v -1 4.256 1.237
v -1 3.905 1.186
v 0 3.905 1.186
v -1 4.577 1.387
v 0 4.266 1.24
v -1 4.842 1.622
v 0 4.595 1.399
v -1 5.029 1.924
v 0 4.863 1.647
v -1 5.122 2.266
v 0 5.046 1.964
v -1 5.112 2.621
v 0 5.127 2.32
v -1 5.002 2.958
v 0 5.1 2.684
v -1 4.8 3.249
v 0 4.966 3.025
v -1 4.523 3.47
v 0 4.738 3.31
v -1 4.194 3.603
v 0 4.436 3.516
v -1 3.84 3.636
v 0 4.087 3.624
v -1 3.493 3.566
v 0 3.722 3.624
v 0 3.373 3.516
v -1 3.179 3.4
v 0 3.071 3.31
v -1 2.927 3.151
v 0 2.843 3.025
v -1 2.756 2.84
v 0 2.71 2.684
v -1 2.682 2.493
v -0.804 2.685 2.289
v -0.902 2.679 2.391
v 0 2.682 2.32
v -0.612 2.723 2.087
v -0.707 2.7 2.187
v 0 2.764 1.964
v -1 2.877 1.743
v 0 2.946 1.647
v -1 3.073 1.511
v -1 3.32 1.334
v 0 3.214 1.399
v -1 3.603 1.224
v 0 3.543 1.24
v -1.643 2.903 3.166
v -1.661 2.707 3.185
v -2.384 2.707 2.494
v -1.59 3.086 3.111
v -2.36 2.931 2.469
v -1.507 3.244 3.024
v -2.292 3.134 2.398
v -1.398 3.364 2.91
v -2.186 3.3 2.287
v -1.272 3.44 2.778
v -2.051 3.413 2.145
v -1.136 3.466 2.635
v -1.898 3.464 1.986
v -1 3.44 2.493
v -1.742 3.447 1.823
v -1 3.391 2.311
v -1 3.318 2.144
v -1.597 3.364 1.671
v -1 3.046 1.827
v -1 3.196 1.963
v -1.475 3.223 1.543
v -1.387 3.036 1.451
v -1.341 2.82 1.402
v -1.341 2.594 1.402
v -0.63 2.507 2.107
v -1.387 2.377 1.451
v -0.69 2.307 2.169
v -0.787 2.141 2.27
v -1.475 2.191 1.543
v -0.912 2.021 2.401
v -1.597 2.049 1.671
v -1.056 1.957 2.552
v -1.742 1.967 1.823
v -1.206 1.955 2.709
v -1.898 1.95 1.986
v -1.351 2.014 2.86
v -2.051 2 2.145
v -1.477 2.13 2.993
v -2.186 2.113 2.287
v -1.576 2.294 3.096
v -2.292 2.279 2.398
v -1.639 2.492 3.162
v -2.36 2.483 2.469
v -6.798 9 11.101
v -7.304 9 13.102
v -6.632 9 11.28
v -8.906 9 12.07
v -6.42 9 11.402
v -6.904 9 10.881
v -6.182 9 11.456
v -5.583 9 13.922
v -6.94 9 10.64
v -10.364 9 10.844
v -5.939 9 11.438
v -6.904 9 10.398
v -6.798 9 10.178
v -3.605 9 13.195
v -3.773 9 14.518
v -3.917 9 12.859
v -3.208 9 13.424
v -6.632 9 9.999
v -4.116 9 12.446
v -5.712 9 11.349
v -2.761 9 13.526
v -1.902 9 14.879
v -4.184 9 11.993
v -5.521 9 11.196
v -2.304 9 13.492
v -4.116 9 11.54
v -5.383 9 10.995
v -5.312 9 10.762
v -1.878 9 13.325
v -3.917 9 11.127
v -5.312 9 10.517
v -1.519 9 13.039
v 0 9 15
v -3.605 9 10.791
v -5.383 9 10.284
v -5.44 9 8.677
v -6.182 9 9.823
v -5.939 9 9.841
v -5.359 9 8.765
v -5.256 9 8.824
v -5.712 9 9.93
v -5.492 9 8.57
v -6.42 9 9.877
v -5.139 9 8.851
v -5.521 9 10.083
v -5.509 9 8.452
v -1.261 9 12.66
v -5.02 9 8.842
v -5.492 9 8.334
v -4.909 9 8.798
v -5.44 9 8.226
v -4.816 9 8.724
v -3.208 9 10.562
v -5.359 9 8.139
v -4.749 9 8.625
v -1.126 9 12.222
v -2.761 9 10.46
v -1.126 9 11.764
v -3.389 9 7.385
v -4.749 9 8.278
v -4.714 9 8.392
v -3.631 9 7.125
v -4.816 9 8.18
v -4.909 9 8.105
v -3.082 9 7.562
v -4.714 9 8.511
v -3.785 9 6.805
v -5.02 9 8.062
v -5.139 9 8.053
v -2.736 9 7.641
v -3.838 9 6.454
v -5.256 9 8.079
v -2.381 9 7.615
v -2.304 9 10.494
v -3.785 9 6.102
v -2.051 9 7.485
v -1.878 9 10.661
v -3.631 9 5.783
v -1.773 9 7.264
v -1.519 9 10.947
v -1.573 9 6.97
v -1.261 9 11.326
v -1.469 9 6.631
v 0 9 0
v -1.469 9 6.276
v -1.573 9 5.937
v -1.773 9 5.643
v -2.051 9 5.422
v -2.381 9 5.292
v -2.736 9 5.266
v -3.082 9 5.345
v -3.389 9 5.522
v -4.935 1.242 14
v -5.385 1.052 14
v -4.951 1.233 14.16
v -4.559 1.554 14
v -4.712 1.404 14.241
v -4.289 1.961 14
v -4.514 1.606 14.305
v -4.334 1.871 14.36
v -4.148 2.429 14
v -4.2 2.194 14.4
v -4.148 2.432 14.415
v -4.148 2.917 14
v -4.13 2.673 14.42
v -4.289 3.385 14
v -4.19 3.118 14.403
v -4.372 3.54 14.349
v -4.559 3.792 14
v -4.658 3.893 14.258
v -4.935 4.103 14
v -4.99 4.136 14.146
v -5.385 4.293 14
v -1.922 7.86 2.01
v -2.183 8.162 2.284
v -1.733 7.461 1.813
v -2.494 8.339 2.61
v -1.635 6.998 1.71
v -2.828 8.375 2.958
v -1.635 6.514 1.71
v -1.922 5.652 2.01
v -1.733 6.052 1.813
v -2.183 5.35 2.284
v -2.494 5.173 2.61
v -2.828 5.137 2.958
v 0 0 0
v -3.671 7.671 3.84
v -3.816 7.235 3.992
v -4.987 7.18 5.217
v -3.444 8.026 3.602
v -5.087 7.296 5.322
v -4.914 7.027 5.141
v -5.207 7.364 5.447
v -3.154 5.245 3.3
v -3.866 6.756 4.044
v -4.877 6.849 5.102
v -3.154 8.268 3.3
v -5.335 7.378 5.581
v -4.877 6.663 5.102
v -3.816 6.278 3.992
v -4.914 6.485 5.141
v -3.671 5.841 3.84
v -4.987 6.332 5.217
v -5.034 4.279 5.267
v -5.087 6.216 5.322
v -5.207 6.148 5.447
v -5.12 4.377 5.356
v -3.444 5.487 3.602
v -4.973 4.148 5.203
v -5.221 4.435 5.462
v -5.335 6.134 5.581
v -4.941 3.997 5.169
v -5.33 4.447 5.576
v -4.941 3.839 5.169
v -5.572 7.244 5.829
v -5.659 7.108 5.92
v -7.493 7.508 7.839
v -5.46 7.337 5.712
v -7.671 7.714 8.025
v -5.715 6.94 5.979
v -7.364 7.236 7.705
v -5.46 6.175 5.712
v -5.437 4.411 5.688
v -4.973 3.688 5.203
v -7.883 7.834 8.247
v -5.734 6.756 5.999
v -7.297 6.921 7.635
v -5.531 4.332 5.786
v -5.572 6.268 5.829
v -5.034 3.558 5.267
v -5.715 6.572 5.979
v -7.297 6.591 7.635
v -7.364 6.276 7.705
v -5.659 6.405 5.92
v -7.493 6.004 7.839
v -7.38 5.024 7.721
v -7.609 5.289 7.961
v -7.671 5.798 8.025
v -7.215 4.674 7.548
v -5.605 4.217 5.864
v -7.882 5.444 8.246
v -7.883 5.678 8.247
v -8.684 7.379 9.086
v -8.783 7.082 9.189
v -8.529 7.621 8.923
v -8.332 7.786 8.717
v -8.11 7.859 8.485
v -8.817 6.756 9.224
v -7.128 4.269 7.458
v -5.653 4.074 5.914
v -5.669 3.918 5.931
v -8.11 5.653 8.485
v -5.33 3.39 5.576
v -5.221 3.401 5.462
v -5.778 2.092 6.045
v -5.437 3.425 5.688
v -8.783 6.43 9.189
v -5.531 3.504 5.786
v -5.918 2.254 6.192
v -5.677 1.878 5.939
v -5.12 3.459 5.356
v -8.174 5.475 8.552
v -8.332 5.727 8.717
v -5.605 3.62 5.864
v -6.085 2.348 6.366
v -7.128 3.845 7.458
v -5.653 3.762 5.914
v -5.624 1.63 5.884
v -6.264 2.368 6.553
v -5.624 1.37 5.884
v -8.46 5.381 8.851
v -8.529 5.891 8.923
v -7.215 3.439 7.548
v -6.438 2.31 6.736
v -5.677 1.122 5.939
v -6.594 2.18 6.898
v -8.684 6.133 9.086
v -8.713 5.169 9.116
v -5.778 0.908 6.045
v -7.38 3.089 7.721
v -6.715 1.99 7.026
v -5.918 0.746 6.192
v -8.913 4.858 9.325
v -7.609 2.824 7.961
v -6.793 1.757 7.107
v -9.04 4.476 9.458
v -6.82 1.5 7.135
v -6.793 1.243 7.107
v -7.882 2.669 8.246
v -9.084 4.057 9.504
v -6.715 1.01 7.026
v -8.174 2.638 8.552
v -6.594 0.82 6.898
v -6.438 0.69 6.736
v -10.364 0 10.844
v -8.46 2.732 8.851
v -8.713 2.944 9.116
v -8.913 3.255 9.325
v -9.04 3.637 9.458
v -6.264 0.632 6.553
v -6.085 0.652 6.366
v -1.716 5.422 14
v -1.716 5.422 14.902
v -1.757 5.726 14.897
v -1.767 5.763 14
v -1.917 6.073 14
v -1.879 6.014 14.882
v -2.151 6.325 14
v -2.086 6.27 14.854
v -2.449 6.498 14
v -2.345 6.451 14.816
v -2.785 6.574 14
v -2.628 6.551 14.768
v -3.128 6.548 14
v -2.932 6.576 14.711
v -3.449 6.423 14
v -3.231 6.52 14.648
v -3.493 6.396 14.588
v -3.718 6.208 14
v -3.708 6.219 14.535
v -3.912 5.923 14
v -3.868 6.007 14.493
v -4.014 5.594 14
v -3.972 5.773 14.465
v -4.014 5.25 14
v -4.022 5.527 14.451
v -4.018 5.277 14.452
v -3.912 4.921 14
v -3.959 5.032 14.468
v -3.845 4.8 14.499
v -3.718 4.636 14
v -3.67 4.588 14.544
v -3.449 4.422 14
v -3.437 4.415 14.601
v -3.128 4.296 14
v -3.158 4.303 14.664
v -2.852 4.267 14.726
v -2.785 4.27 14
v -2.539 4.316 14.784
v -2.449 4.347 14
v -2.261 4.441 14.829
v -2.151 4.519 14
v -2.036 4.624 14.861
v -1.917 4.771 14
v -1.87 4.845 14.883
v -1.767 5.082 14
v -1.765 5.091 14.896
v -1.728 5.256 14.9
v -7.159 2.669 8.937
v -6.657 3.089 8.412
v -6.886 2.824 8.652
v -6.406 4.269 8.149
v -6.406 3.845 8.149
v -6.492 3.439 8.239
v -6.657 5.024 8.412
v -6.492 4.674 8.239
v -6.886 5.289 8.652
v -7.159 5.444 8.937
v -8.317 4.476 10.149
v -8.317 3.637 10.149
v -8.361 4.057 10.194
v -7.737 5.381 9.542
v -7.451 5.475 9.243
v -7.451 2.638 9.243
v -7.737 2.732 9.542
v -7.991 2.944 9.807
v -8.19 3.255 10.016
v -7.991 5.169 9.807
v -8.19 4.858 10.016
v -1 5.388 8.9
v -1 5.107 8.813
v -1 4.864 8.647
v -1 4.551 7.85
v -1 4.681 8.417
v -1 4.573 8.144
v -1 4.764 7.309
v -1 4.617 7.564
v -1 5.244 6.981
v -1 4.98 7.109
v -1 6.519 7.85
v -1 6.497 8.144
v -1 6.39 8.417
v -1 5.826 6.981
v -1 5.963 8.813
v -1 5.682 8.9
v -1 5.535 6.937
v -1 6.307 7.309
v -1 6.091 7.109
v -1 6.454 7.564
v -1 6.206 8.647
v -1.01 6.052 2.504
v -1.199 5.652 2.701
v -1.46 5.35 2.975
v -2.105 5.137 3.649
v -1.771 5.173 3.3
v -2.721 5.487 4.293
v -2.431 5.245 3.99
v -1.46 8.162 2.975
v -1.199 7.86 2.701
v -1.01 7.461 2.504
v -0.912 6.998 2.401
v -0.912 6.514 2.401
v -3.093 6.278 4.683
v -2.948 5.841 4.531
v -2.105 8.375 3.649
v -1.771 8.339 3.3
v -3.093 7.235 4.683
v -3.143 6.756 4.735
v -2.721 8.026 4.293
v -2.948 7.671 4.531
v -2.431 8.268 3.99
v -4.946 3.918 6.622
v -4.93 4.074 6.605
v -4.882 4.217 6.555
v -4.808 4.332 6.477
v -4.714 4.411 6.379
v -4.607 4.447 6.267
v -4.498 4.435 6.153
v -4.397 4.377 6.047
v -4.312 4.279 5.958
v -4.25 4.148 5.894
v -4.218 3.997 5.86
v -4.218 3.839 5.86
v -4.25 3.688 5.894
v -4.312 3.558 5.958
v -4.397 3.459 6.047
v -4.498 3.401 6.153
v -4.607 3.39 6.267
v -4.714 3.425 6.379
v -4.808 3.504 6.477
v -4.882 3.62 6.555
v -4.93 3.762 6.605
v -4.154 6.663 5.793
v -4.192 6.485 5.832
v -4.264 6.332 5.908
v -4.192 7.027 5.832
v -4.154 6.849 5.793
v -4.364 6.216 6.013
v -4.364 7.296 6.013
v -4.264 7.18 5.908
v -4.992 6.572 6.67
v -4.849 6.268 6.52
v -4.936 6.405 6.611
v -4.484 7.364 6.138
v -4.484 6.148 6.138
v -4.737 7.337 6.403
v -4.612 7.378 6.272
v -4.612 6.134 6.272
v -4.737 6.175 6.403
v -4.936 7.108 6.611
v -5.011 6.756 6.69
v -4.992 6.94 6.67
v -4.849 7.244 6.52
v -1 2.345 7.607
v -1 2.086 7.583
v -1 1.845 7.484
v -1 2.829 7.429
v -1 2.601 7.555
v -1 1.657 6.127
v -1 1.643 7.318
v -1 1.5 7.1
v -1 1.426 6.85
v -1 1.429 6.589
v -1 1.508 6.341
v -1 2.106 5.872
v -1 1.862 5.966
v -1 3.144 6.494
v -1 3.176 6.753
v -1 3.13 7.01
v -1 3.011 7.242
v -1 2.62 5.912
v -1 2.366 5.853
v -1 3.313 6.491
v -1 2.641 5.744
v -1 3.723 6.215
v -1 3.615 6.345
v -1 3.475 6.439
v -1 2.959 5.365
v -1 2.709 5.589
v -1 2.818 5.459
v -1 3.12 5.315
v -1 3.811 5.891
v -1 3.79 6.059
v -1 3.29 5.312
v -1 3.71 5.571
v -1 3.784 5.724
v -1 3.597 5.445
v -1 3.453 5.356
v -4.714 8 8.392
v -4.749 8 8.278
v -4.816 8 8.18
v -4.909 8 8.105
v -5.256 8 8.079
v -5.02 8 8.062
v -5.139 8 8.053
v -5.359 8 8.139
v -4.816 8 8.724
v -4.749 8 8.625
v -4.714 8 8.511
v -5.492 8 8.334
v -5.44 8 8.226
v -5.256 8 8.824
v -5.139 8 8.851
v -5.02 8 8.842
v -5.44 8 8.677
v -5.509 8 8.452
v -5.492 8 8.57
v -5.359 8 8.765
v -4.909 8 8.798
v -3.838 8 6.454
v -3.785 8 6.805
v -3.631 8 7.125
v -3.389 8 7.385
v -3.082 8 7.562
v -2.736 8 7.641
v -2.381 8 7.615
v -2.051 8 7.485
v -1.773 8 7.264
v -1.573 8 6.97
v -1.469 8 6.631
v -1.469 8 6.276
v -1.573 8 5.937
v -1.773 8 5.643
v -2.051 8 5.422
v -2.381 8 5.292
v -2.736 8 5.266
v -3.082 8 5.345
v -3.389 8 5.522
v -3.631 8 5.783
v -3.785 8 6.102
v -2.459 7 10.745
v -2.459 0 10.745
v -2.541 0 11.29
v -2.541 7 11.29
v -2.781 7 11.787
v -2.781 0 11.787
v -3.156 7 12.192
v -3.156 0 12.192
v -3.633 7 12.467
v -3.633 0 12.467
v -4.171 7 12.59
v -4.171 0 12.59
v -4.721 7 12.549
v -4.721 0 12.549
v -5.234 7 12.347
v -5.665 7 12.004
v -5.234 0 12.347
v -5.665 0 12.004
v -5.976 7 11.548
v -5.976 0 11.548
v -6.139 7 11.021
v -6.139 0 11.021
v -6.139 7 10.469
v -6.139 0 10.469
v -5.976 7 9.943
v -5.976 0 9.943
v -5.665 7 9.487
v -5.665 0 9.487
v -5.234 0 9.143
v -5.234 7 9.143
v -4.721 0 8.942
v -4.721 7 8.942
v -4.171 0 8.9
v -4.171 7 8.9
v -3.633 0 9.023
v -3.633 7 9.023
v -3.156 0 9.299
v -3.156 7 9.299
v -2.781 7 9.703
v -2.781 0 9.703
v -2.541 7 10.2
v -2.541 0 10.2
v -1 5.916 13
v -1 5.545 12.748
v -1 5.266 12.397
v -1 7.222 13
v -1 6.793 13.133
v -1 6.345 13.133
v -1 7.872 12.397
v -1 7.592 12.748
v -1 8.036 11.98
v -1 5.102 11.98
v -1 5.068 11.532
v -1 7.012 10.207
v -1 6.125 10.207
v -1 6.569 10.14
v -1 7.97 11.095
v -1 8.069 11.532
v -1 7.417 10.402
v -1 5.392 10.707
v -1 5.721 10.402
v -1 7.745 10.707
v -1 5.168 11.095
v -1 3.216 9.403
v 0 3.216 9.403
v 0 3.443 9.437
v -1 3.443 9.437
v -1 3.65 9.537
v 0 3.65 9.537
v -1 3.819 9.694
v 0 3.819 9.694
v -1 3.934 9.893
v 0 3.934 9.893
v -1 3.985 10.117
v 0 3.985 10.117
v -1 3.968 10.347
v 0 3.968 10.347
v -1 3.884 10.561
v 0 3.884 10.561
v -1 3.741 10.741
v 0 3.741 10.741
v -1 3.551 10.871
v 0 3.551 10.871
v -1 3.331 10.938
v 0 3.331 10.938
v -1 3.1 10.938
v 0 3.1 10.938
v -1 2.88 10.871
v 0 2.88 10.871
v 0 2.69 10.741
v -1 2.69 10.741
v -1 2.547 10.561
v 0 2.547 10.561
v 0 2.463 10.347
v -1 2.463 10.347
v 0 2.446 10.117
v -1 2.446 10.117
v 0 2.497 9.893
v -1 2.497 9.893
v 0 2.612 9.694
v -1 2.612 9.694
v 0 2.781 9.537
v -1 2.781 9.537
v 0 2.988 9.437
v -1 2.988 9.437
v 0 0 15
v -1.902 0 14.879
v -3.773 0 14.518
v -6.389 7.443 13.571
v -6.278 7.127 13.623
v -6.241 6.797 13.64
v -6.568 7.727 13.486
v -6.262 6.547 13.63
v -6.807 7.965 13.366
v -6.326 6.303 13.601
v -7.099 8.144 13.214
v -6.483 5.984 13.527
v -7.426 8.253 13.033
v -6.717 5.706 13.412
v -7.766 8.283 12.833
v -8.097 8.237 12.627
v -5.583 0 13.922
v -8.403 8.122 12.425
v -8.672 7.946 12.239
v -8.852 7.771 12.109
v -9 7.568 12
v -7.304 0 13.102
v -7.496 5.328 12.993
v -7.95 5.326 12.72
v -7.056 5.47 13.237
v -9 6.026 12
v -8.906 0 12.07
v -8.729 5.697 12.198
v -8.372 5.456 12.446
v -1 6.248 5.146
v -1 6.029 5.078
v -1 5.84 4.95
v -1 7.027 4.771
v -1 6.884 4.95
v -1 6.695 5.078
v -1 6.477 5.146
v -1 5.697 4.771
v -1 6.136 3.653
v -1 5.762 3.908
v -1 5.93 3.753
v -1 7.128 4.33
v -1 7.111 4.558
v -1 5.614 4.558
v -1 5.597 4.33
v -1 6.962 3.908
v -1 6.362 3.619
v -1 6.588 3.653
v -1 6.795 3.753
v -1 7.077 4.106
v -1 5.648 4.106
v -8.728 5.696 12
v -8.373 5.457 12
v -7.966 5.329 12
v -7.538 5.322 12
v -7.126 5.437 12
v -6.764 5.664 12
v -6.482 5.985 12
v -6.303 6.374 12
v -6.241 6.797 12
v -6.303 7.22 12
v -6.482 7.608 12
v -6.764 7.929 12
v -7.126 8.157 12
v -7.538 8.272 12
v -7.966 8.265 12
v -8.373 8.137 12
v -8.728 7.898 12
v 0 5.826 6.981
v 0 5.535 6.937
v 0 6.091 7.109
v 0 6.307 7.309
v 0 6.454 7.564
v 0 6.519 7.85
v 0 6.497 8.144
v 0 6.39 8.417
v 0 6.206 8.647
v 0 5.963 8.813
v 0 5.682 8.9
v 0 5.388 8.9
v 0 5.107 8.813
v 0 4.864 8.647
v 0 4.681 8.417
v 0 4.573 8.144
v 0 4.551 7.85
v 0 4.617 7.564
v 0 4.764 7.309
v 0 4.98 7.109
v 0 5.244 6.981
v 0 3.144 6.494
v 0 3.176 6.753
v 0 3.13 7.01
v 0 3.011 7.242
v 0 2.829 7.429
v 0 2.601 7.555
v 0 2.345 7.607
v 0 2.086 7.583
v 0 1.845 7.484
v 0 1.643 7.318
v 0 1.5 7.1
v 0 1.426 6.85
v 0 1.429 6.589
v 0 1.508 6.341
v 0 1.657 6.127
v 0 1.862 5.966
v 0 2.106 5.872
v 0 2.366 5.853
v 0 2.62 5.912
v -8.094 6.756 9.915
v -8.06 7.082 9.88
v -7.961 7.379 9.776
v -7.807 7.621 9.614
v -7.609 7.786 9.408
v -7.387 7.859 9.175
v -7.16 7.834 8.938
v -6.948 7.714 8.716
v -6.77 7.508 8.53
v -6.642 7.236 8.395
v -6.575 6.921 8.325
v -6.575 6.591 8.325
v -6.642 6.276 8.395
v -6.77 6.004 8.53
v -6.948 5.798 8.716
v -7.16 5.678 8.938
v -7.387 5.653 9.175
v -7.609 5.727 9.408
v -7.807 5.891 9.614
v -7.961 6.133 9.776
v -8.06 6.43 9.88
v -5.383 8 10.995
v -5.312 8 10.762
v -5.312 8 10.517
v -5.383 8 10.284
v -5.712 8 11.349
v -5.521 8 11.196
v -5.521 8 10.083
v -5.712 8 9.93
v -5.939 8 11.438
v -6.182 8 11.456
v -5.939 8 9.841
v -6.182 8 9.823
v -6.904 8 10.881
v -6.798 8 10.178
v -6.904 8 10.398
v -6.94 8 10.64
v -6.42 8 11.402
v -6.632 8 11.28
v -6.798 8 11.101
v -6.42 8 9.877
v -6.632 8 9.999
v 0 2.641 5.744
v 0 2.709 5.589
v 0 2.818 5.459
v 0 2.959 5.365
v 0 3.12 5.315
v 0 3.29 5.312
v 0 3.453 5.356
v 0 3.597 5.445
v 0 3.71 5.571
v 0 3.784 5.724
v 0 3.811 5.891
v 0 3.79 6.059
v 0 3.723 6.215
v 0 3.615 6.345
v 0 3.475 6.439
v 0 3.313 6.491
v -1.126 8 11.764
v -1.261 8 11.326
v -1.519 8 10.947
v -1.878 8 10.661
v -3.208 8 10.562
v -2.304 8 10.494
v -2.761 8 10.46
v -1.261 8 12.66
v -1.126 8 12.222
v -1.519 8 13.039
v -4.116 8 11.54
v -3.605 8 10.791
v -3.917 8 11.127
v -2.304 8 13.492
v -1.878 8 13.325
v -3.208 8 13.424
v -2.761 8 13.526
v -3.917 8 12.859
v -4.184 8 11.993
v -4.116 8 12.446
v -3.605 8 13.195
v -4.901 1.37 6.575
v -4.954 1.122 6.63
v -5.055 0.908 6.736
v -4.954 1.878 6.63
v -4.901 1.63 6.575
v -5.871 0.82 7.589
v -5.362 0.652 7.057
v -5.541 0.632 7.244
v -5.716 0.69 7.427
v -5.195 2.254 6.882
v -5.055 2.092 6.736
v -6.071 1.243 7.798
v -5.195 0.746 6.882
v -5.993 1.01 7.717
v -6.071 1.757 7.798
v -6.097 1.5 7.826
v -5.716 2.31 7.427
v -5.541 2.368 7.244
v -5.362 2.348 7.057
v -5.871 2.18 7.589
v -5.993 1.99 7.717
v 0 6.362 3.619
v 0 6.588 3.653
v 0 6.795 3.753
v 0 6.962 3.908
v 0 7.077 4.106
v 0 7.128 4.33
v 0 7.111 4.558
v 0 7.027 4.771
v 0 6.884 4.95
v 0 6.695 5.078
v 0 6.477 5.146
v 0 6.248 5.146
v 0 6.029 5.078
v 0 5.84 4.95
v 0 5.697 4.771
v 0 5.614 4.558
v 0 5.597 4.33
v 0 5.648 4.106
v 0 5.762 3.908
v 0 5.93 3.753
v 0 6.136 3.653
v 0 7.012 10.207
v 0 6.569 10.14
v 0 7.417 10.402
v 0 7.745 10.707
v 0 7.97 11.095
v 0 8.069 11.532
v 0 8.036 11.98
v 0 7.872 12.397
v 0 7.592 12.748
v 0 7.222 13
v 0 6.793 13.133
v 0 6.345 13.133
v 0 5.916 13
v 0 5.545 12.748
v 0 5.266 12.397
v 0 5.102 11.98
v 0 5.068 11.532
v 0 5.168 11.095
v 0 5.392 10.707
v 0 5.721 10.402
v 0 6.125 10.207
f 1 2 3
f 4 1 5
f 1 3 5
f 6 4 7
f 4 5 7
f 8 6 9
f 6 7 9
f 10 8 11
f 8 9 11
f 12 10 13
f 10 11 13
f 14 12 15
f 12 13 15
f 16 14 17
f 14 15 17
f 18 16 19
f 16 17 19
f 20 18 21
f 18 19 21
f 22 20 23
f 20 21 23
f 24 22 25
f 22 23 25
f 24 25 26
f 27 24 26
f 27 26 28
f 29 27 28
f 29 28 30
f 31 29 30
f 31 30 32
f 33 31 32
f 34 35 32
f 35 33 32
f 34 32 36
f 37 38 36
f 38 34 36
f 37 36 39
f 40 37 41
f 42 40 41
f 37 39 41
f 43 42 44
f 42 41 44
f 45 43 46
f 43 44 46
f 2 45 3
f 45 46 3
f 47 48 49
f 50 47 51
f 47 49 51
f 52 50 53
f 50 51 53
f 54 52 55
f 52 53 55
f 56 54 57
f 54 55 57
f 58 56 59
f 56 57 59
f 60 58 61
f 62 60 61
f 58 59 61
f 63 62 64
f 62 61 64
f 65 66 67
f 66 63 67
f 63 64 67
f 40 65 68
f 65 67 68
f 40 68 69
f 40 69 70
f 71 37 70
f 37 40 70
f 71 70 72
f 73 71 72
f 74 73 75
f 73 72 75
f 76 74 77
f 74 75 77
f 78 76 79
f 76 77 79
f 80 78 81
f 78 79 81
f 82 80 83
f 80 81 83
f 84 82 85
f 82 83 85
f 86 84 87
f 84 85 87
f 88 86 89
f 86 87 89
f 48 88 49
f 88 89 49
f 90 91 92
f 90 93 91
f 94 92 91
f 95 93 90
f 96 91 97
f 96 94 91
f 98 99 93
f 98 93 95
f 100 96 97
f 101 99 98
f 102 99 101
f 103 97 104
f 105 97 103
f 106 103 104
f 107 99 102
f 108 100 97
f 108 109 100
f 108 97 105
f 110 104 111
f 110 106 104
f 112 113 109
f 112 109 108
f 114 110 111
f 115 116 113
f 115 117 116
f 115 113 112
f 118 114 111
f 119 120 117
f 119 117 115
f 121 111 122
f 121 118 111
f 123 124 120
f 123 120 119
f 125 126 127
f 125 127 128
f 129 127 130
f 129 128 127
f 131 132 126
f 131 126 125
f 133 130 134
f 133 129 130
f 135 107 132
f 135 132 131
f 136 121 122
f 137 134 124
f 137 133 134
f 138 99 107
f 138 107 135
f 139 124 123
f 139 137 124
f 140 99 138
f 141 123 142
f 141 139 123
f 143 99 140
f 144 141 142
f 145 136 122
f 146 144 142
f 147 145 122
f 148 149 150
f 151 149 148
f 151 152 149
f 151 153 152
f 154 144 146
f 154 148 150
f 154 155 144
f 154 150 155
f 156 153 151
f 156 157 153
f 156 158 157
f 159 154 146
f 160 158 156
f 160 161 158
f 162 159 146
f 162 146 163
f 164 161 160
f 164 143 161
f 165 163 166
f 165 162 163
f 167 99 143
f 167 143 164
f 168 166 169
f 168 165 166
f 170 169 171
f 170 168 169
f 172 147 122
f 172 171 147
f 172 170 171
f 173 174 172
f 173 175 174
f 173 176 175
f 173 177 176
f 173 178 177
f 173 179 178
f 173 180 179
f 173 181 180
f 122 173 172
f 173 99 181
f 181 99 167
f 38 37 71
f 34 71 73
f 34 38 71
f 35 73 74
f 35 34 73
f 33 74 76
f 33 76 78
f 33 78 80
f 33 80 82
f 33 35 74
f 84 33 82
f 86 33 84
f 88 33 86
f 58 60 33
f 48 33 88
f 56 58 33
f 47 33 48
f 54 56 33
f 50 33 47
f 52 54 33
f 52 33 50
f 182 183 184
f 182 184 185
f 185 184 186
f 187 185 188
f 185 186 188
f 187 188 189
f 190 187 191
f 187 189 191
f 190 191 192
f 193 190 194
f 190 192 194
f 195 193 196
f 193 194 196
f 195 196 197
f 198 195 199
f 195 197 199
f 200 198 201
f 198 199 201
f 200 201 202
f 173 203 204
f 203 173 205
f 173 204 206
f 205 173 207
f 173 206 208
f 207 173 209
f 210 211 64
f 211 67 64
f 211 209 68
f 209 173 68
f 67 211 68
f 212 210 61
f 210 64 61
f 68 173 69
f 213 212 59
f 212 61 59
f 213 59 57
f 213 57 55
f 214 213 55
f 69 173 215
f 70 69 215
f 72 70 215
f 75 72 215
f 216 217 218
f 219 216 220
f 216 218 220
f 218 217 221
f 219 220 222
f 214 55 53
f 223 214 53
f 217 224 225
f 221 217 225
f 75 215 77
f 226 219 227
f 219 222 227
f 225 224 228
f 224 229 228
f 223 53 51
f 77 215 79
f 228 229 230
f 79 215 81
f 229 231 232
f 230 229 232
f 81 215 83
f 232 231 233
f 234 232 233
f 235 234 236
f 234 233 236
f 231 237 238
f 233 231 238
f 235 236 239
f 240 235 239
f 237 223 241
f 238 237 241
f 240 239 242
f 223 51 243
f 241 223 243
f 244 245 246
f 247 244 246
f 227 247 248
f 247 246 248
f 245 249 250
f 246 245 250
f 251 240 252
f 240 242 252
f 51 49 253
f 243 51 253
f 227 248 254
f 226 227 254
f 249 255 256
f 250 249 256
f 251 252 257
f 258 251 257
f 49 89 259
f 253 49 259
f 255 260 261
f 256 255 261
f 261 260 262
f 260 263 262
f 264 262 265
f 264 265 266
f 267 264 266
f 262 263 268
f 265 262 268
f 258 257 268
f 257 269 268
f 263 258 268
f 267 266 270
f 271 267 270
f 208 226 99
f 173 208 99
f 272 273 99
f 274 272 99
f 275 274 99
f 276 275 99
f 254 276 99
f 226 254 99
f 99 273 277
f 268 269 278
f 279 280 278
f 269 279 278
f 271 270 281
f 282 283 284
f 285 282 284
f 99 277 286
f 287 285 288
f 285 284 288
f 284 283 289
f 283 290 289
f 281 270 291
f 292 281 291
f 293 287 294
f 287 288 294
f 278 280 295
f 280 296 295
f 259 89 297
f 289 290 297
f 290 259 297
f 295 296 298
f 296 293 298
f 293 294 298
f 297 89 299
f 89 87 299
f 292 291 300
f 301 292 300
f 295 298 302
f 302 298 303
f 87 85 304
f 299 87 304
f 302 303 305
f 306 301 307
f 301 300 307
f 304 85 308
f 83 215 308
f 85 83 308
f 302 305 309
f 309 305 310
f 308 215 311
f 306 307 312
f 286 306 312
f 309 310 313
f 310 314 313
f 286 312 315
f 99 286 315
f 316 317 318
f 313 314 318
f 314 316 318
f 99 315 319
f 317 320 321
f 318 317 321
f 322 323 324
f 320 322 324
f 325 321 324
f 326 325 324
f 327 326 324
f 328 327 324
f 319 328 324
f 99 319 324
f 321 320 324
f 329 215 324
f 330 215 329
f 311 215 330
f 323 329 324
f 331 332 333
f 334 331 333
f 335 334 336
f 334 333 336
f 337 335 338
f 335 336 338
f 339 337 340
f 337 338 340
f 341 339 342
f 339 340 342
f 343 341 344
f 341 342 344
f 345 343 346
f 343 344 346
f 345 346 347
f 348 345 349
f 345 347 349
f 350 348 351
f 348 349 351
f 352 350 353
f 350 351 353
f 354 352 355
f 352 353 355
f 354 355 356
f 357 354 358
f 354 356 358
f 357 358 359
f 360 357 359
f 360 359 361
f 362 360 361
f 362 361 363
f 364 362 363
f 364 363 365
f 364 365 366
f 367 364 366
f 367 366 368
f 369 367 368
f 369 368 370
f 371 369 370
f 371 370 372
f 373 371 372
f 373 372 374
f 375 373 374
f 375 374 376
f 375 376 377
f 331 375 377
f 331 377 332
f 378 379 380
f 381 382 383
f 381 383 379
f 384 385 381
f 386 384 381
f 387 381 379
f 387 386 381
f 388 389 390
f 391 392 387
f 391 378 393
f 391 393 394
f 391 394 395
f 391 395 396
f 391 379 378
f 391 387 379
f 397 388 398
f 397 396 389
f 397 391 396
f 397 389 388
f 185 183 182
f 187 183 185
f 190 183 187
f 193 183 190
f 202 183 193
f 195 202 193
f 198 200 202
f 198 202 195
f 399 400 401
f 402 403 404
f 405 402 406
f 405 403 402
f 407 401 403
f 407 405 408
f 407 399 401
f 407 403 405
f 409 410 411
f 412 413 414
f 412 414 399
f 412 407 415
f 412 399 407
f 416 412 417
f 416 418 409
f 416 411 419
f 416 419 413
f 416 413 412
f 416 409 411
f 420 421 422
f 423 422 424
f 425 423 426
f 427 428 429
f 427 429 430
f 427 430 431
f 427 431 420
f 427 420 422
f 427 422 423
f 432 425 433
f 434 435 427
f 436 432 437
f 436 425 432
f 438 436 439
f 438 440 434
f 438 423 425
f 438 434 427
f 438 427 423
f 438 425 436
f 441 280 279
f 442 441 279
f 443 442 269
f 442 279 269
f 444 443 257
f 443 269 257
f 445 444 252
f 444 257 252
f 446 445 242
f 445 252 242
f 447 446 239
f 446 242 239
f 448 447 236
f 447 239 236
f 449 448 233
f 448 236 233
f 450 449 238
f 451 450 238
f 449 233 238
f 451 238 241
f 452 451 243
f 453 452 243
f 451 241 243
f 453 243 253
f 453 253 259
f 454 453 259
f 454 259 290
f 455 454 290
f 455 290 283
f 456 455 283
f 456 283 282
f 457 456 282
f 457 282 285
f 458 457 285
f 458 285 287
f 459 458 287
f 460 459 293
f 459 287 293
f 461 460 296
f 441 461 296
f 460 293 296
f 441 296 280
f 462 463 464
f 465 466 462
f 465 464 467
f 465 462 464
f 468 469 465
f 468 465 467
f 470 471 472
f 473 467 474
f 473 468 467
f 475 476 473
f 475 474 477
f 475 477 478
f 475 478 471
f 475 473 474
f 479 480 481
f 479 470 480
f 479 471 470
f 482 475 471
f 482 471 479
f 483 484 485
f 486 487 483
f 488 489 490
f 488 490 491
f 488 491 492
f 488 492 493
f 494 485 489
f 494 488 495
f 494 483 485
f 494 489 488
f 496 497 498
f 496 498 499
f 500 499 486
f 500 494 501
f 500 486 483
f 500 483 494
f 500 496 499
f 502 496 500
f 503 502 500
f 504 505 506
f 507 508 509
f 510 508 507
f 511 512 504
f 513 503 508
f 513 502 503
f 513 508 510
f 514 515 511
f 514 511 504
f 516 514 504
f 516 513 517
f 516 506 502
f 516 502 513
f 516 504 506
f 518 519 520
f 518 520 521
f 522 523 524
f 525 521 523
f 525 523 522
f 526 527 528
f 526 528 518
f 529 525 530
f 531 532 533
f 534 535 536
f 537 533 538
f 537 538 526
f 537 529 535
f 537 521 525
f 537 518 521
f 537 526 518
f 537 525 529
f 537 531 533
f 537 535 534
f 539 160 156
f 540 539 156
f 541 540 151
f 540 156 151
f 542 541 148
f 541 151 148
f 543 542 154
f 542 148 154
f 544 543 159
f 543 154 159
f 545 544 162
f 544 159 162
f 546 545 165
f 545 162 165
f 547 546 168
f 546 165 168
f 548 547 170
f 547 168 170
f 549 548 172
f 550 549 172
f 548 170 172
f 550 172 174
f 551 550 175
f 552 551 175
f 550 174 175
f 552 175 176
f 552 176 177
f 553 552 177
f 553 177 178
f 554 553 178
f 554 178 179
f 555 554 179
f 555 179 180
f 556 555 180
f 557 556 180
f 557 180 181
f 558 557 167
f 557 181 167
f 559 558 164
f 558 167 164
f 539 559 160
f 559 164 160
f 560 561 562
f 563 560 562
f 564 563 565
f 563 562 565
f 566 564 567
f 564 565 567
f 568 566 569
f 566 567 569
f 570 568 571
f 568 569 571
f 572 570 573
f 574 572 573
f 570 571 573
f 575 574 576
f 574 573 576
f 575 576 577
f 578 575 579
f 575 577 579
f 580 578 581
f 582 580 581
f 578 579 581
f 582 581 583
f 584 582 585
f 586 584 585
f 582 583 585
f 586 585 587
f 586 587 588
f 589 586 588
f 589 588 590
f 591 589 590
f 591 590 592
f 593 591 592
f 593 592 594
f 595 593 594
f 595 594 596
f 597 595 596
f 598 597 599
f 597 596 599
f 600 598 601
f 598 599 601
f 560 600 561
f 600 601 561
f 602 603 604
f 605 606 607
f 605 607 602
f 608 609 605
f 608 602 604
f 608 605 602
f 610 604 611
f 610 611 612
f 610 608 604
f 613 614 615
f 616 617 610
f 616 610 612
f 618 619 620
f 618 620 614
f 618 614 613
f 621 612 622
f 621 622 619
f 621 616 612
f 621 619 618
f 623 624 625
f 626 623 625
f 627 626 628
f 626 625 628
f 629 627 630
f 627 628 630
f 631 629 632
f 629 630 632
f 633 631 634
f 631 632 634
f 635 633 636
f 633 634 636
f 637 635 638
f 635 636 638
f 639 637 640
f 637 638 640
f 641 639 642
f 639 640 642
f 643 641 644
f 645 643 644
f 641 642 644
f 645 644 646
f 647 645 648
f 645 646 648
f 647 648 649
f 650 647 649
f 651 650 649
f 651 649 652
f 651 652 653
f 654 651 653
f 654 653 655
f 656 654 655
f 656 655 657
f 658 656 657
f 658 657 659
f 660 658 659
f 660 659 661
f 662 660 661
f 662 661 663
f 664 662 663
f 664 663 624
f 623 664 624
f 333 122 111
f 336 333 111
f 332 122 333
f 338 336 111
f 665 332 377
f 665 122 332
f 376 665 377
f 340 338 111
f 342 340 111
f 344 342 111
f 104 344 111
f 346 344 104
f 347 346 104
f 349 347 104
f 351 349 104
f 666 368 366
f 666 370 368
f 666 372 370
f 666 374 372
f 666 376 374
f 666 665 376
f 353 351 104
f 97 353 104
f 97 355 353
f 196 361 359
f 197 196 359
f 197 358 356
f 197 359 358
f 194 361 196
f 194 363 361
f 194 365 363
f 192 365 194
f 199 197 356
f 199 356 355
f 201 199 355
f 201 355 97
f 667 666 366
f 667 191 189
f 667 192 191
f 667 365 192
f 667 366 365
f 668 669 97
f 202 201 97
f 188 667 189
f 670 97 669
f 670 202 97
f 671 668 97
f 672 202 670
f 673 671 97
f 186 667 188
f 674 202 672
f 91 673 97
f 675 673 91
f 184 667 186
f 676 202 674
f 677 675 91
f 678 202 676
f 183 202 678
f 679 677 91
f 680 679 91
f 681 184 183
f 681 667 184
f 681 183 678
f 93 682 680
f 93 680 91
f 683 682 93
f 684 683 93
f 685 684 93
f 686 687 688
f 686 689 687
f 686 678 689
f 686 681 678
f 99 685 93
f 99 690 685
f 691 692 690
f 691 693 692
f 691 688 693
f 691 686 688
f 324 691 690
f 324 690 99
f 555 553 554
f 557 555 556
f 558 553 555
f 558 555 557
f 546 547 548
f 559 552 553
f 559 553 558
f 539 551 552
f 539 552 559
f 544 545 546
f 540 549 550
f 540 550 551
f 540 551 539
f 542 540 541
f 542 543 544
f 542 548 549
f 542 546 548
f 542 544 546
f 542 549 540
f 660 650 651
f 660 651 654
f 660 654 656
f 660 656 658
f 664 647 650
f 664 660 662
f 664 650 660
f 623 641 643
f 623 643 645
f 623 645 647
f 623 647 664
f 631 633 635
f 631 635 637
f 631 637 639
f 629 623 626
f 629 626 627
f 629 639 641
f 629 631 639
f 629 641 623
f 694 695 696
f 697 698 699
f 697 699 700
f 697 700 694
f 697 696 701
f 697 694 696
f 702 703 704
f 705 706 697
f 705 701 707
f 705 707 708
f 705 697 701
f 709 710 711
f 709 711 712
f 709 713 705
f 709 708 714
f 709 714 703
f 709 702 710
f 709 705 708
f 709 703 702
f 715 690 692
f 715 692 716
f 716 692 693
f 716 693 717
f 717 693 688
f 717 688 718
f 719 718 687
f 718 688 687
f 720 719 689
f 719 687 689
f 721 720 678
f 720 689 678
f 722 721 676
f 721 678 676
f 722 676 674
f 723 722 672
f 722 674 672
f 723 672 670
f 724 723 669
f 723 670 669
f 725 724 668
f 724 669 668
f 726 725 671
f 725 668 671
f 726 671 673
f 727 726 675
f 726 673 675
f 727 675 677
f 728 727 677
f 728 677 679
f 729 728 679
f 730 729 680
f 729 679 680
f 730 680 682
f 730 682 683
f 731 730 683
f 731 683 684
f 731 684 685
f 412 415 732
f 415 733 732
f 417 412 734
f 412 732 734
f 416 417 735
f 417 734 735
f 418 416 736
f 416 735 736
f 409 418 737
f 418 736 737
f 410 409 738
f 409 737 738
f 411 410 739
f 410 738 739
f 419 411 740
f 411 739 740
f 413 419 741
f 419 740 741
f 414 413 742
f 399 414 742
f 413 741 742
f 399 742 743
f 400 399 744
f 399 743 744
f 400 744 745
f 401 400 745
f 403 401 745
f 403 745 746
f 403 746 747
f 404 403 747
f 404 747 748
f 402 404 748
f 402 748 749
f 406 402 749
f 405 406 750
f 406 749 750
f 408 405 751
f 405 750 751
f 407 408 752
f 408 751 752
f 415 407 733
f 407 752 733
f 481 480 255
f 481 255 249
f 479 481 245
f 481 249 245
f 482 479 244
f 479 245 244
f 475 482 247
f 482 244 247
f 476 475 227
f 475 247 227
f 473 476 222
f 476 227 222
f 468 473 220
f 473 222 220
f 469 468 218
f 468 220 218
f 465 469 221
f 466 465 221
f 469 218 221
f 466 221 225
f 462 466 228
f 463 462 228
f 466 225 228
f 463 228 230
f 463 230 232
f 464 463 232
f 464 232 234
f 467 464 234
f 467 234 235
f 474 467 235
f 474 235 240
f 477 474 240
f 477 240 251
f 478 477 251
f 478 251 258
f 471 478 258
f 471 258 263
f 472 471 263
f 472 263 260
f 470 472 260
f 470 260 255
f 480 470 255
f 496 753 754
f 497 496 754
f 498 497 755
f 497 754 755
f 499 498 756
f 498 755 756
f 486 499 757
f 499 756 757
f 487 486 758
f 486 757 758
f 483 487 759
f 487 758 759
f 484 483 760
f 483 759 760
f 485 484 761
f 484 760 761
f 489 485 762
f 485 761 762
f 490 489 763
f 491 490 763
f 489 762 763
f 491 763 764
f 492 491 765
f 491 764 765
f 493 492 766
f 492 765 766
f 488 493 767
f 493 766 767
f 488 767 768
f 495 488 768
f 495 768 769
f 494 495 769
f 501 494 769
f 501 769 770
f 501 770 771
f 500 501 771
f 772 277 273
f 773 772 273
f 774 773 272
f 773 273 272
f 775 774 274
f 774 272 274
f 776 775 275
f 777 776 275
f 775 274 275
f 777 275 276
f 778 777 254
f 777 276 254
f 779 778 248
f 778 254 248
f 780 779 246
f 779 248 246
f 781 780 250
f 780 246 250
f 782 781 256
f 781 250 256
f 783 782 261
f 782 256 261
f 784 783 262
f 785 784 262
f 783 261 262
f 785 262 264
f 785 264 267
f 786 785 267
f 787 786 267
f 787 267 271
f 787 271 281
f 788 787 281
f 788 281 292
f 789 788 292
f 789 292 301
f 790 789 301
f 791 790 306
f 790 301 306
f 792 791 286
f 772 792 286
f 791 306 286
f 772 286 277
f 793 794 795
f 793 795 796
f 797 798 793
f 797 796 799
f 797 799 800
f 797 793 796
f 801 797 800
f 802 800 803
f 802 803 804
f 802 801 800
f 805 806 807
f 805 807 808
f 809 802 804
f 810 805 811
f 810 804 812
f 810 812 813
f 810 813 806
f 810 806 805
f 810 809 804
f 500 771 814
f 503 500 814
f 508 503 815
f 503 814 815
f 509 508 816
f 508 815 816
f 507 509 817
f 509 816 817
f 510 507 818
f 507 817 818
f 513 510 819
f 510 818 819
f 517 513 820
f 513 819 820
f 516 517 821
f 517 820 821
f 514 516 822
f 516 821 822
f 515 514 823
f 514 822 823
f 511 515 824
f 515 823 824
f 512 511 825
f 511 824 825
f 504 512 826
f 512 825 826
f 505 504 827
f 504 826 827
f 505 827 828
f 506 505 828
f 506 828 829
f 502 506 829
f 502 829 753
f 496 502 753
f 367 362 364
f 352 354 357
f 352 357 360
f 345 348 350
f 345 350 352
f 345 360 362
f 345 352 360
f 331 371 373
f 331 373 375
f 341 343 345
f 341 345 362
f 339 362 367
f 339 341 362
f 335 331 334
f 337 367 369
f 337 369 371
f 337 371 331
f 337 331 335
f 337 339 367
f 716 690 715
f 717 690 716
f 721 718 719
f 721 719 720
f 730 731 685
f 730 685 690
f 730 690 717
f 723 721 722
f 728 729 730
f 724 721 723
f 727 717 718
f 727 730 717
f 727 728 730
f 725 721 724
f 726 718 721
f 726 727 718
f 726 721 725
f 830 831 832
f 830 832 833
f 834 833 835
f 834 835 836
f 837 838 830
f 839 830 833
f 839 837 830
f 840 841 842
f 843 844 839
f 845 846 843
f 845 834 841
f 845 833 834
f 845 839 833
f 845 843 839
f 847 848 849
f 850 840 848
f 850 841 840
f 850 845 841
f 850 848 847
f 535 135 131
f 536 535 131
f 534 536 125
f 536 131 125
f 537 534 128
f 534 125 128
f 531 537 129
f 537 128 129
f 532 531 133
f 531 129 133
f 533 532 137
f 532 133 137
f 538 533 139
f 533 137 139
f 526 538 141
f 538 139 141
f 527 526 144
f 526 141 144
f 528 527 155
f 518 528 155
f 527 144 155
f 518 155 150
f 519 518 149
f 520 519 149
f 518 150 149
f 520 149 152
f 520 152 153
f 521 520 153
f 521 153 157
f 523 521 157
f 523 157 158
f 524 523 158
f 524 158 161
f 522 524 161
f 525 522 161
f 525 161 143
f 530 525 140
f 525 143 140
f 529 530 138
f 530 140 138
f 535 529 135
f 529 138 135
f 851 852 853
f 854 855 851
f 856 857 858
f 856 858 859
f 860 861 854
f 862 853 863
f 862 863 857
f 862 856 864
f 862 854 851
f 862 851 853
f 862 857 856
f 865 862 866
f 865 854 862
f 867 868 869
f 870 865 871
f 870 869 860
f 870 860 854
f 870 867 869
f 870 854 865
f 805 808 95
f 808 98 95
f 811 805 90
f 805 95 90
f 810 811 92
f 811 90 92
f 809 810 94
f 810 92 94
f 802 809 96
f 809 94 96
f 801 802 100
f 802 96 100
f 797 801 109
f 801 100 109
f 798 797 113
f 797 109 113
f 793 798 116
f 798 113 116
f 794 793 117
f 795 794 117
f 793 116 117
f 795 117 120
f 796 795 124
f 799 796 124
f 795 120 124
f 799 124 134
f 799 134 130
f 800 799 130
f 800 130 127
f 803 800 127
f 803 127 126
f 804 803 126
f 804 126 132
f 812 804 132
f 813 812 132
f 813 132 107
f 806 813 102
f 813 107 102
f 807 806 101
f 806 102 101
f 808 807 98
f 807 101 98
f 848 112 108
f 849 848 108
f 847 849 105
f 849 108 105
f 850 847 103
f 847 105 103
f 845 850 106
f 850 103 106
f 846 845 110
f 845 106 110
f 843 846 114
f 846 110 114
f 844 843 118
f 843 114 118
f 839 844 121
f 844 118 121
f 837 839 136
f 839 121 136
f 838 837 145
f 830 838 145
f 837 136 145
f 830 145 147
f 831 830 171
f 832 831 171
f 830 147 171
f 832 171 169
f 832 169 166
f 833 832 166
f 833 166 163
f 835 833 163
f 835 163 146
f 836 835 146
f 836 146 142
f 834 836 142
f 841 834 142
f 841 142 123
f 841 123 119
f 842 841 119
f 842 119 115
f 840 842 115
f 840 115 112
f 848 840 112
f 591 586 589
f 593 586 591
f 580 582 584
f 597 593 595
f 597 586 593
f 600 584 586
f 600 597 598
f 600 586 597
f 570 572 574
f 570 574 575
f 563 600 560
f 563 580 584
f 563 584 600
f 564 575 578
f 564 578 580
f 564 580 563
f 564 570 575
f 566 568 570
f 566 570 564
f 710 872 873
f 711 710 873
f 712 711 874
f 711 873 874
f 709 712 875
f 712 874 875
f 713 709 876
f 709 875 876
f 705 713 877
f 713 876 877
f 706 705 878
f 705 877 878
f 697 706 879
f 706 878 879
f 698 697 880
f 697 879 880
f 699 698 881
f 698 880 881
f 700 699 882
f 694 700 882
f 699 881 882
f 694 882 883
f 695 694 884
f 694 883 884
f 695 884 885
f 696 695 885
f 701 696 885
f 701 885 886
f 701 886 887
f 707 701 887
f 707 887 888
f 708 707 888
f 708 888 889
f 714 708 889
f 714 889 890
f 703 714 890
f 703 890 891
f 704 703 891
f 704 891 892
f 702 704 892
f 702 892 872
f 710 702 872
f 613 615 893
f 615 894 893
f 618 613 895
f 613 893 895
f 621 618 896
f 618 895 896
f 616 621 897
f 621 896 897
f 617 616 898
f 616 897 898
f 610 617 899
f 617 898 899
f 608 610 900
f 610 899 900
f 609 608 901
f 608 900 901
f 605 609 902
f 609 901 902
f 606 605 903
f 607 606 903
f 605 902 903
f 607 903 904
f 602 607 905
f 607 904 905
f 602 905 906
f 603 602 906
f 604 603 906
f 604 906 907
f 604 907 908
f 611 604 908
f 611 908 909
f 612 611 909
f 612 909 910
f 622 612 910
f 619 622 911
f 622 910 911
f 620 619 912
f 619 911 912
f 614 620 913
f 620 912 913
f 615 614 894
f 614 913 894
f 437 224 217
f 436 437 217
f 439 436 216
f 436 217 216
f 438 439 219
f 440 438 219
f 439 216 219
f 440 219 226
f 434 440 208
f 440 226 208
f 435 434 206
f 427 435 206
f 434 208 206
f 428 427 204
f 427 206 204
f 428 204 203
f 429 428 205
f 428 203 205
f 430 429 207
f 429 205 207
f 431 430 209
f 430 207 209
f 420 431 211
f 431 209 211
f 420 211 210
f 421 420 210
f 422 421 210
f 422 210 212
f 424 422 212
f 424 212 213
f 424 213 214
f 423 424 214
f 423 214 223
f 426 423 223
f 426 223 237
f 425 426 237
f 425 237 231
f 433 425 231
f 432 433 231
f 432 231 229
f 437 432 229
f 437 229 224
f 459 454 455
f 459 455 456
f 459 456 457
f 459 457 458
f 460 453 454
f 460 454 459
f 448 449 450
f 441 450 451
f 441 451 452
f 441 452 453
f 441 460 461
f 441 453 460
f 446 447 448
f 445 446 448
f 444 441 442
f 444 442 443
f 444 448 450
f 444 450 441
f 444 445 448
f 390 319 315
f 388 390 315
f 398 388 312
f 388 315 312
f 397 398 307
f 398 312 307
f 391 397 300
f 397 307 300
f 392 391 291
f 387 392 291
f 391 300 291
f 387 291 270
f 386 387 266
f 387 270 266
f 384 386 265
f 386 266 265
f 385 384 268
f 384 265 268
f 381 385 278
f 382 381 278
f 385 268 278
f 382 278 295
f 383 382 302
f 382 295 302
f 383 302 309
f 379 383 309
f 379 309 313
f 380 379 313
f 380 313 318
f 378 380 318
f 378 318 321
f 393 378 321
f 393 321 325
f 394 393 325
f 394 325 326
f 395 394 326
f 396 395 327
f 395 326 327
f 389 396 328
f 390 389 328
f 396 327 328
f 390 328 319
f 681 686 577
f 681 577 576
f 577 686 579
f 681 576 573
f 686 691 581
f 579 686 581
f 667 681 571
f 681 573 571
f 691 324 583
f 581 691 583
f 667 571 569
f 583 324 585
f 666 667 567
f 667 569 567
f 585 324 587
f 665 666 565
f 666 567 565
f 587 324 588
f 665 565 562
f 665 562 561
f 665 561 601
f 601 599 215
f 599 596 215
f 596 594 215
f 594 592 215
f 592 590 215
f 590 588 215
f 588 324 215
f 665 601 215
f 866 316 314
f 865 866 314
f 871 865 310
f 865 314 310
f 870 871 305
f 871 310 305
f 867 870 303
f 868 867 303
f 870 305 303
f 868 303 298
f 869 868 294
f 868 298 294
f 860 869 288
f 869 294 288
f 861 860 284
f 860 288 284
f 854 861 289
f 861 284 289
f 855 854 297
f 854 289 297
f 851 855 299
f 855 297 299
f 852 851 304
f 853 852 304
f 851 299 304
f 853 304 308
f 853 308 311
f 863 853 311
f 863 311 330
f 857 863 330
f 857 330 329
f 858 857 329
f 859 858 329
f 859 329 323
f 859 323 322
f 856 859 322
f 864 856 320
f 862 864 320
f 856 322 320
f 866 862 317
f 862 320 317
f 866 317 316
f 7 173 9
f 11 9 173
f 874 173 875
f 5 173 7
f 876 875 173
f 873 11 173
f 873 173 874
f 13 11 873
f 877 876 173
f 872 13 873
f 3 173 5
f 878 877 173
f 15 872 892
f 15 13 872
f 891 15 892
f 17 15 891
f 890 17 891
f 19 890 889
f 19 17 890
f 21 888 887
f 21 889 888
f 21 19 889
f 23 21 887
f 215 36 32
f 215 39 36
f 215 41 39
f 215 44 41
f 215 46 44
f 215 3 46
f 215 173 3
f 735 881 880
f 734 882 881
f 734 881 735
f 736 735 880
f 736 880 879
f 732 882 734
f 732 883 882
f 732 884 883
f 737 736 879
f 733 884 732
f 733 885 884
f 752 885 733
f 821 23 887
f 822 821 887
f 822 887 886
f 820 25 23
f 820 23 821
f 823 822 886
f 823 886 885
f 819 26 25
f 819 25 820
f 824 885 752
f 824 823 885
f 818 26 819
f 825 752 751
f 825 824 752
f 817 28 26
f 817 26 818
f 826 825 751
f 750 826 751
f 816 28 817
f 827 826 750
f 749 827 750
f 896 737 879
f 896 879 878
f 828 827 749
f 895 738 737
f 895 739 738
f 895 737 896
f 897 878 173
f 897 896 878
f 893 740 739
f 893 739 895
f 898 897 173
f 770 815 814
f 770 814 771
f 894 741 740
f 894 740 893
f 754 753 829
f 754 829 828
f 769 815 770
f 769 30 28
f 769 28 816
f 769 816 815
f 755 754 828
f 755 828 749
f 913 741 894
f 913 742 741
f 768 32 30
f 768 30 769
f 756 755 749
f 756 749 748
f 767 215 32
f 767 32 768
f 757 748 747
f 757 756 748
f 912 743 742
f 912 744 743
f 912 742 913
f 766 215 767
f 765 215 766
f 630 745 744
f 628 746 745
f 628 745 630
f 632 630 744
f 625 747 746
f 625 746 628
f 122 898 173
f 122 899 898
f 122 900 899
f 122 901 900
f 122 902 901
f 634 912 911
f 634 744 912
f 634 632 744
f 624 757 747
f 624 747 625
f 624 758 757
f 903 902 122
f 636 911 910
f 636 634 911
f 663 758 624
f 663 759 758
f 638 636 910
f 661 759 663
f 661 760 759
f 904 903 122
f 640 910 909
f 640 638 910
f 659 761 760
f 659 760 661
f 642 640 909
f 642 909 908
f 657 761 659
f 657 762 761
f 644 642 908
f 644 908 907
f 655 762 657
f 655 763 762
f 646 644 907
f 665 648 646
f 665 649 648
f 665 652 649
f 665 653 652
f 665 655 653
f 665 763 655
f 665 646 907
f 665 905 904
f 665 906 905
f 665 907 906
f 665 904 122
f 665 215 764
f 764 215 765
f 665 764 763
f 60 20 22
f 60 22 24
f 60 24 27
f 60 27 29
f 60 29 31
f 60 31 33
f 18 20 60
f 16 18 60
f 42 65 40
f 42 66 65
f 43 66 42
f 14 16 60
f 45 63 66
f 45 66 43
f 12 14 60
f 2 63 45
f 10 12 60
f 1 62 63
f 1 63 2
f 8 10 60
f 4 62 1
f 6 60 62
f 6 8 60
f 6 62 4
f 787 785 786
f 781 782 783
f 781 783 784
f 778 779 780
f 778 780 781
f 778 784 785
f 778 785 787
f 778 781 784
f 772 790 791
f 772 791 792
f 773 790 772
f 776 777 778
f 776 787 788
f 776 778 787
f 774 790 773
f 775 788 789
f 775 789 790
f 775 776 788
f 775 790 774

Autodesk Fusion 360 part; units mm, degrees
sketch "Skizze1" plane through (0, 0, 0) normal (0, 1, 0) x (1, 0, 0)
  line L0 (0, 0) -> (0, -15)
  line L1 (0, -15) -> (15, -15)
  line L2 (15, -15) -> (15, 0)
  line L3 (15, 0) -> (0, 0)
  line L4 (15, 0) -> (17.5, 0)
  line L5 (17.5, 0) -> (17.5, -15)
  line L6 (17.5, -15) -> (15, -15)
  dimension "d1" = 15
  dimension "d2" = 15
  dimension "d3" = 2.5
sketch "Skizze2" plane through (0, 13, 0) normal (0, 1, 0) x (-1, 0, 0)
sketch "Skizze3" plane through (0, 0, 0) normal (0, 1, 0) x (1, 0, 0)
  line L0 (0, 0) -> (0, -15)
  line L1 (0, -15) -> (0, 0)
  circle A0 centre (0, 0) radius 15
  line L2 (0, 0) -> (-10.3643, -10.8435)
extrude "Extrusion2" add sketch "Skizze3" along normal blind 9 contours L0 L1 A0 L2 picked at (-1.8916, -9.7989)
sketch "Skizze4" plane through (0, 0, 0) normal (-0.7229, 0, -0.691) x (-0.691, 0, 0.7229)
  line L0 (0, 0) -> (15, 0)
  line L1 (15, 0) -> (15, 9)
  line L2 (15, 9) -> (0, 9)
  line L3 (0, 9) -> (0, 0)
  circle A0 centre (2.6906, 2.7068) radius 0.759
  circle A1 centre (3.9712, 6.7561) radius 1.6237
  circle A2 centre (11.6545, 6.7561) radius 1.1059
  circle A3 centre (7.6744, 3.9181) radius 0.5299
  circle A4 centre (7.6744, 6.7561) radius 0.6239
  circle A5 centre (9, 1.5) radius 0.8703
  circle A6 centre (11.7237, 4.0566) radius 1.4228
extrude "Extrusion3" cut sketch "Skizze4" against normal blind 1 contours A0 | A1 | A2 | A3 | A4 | A5 | A6
sketch "Skizze5" plane through (0, 9, 0) normal (0, 1, 0) x (-1, 0, 0)
  line L0 (0, 0) -> (10.3643, 10.8435)
  arc A0 (10.3643, 10.8435) -> (0, 15) centre (0, 0) ccw
  line L1 (0, 15) -> (0, 0)
  circle A1 centre (2.6465, 11.993) radius 1.5376
  circle A2 centre (2.6465, 6.4536) radius 1.1912
  circle A3 centre (6.1213, 10.6395) radius 0.8189
  circle A4 centre (5.1094, 8.4518) radius 0.4
extrude "Extrusion4" cut sketch "Skizze5" against normal blind 1 contours A1 | A2 | A3 | A4
sketch "Skizze6" plane through (0, 0, 0) normal (1, 0, 0) x (0, 0, -1)
  line L0 (-15, 0) -> (0, 0)
  line L1 (0, 0) -> (0, 9)
  line L2 (0, 9) -> (-15, 9)
  line L3 (-15, 9) -> (-15, 0)
  circle A0 centre (-11.6448, 6.5689) radius 1.5047
  circle A1 centre (-10.1749, 3.2155) radius 0.7721
  circle A2 centre (-4.3869, 6.3622) radius 0.7676
  circle A3 centre (-5.9028, 3.2155) radius 0.5958
  circle A4 centre (-2.4117, 3.9046) radius 1.2257
  circle A5 centre (-7.924, 5.5353) radius 0.9866
  circle A6 centre (-6.7297, 2.2968) radius 0.8791
extrude "Extrusion5" cut sketch "Skizze6" against normal blind 1 contours A0 | A1 | A2 | A3 A6 | A3 A6 | A3 A6 | A4 | A5
sketch "Skizze7" plane through (0, 0, 0) normal (0, 0, 1) x (1, 0, 0)
  circle A0 centre (-7.7636, 6.803) radius 1.5064
  circle A1 centre (-2.9408, 5.4698) radius 1.0472
  circle A2 centre (-5.8227, 2.6859) radius 1.6102
ref_plane "Arbeitsebene1" through (-7.7636, 6.803, 16) normal (0, 0, 1) x (1, 0, 0)
sketch "Skizze8" plane through (0, 0, 16) normal (0, 0, 1) x (1, 0, 0)
  circle A0 centre (-7.7283, 6.7967) radius 1.4872
  circle A1 centre (-5.8039, 2.6728) radius 1.6738
  circle A2 centre (-2.8714, 5.4221) radius 1.1553
extrude "Extrusion6" cut sketch "Skizze8" against normal blind 2
extrude "Extrusion7" cut sketch "Skizze8" against normal blind 4 contours A0
sketch "Skizze9" plane through (0, 0, 0) normal (0, -1, 0) x (1, 0, 0)
  line L0 (-10.3643, 10.8435) -> (0, 0)
  line L1 (0, 0) -> (0, 15)
  arc A0 (0, 15) -> (-10.3643, 10.8435) centre (0, 0) ccw
  line L2 (0, 0) -> (-5.5833, 13.9222)
  circle A1 centre (-4.3092, 10.7452) radius 1.85
  dimension "d19" = 3.7
extrude "Extrusion8" cut sketch "Skizze9" against normal blind 7 contours L2 A1 | L2 A1
